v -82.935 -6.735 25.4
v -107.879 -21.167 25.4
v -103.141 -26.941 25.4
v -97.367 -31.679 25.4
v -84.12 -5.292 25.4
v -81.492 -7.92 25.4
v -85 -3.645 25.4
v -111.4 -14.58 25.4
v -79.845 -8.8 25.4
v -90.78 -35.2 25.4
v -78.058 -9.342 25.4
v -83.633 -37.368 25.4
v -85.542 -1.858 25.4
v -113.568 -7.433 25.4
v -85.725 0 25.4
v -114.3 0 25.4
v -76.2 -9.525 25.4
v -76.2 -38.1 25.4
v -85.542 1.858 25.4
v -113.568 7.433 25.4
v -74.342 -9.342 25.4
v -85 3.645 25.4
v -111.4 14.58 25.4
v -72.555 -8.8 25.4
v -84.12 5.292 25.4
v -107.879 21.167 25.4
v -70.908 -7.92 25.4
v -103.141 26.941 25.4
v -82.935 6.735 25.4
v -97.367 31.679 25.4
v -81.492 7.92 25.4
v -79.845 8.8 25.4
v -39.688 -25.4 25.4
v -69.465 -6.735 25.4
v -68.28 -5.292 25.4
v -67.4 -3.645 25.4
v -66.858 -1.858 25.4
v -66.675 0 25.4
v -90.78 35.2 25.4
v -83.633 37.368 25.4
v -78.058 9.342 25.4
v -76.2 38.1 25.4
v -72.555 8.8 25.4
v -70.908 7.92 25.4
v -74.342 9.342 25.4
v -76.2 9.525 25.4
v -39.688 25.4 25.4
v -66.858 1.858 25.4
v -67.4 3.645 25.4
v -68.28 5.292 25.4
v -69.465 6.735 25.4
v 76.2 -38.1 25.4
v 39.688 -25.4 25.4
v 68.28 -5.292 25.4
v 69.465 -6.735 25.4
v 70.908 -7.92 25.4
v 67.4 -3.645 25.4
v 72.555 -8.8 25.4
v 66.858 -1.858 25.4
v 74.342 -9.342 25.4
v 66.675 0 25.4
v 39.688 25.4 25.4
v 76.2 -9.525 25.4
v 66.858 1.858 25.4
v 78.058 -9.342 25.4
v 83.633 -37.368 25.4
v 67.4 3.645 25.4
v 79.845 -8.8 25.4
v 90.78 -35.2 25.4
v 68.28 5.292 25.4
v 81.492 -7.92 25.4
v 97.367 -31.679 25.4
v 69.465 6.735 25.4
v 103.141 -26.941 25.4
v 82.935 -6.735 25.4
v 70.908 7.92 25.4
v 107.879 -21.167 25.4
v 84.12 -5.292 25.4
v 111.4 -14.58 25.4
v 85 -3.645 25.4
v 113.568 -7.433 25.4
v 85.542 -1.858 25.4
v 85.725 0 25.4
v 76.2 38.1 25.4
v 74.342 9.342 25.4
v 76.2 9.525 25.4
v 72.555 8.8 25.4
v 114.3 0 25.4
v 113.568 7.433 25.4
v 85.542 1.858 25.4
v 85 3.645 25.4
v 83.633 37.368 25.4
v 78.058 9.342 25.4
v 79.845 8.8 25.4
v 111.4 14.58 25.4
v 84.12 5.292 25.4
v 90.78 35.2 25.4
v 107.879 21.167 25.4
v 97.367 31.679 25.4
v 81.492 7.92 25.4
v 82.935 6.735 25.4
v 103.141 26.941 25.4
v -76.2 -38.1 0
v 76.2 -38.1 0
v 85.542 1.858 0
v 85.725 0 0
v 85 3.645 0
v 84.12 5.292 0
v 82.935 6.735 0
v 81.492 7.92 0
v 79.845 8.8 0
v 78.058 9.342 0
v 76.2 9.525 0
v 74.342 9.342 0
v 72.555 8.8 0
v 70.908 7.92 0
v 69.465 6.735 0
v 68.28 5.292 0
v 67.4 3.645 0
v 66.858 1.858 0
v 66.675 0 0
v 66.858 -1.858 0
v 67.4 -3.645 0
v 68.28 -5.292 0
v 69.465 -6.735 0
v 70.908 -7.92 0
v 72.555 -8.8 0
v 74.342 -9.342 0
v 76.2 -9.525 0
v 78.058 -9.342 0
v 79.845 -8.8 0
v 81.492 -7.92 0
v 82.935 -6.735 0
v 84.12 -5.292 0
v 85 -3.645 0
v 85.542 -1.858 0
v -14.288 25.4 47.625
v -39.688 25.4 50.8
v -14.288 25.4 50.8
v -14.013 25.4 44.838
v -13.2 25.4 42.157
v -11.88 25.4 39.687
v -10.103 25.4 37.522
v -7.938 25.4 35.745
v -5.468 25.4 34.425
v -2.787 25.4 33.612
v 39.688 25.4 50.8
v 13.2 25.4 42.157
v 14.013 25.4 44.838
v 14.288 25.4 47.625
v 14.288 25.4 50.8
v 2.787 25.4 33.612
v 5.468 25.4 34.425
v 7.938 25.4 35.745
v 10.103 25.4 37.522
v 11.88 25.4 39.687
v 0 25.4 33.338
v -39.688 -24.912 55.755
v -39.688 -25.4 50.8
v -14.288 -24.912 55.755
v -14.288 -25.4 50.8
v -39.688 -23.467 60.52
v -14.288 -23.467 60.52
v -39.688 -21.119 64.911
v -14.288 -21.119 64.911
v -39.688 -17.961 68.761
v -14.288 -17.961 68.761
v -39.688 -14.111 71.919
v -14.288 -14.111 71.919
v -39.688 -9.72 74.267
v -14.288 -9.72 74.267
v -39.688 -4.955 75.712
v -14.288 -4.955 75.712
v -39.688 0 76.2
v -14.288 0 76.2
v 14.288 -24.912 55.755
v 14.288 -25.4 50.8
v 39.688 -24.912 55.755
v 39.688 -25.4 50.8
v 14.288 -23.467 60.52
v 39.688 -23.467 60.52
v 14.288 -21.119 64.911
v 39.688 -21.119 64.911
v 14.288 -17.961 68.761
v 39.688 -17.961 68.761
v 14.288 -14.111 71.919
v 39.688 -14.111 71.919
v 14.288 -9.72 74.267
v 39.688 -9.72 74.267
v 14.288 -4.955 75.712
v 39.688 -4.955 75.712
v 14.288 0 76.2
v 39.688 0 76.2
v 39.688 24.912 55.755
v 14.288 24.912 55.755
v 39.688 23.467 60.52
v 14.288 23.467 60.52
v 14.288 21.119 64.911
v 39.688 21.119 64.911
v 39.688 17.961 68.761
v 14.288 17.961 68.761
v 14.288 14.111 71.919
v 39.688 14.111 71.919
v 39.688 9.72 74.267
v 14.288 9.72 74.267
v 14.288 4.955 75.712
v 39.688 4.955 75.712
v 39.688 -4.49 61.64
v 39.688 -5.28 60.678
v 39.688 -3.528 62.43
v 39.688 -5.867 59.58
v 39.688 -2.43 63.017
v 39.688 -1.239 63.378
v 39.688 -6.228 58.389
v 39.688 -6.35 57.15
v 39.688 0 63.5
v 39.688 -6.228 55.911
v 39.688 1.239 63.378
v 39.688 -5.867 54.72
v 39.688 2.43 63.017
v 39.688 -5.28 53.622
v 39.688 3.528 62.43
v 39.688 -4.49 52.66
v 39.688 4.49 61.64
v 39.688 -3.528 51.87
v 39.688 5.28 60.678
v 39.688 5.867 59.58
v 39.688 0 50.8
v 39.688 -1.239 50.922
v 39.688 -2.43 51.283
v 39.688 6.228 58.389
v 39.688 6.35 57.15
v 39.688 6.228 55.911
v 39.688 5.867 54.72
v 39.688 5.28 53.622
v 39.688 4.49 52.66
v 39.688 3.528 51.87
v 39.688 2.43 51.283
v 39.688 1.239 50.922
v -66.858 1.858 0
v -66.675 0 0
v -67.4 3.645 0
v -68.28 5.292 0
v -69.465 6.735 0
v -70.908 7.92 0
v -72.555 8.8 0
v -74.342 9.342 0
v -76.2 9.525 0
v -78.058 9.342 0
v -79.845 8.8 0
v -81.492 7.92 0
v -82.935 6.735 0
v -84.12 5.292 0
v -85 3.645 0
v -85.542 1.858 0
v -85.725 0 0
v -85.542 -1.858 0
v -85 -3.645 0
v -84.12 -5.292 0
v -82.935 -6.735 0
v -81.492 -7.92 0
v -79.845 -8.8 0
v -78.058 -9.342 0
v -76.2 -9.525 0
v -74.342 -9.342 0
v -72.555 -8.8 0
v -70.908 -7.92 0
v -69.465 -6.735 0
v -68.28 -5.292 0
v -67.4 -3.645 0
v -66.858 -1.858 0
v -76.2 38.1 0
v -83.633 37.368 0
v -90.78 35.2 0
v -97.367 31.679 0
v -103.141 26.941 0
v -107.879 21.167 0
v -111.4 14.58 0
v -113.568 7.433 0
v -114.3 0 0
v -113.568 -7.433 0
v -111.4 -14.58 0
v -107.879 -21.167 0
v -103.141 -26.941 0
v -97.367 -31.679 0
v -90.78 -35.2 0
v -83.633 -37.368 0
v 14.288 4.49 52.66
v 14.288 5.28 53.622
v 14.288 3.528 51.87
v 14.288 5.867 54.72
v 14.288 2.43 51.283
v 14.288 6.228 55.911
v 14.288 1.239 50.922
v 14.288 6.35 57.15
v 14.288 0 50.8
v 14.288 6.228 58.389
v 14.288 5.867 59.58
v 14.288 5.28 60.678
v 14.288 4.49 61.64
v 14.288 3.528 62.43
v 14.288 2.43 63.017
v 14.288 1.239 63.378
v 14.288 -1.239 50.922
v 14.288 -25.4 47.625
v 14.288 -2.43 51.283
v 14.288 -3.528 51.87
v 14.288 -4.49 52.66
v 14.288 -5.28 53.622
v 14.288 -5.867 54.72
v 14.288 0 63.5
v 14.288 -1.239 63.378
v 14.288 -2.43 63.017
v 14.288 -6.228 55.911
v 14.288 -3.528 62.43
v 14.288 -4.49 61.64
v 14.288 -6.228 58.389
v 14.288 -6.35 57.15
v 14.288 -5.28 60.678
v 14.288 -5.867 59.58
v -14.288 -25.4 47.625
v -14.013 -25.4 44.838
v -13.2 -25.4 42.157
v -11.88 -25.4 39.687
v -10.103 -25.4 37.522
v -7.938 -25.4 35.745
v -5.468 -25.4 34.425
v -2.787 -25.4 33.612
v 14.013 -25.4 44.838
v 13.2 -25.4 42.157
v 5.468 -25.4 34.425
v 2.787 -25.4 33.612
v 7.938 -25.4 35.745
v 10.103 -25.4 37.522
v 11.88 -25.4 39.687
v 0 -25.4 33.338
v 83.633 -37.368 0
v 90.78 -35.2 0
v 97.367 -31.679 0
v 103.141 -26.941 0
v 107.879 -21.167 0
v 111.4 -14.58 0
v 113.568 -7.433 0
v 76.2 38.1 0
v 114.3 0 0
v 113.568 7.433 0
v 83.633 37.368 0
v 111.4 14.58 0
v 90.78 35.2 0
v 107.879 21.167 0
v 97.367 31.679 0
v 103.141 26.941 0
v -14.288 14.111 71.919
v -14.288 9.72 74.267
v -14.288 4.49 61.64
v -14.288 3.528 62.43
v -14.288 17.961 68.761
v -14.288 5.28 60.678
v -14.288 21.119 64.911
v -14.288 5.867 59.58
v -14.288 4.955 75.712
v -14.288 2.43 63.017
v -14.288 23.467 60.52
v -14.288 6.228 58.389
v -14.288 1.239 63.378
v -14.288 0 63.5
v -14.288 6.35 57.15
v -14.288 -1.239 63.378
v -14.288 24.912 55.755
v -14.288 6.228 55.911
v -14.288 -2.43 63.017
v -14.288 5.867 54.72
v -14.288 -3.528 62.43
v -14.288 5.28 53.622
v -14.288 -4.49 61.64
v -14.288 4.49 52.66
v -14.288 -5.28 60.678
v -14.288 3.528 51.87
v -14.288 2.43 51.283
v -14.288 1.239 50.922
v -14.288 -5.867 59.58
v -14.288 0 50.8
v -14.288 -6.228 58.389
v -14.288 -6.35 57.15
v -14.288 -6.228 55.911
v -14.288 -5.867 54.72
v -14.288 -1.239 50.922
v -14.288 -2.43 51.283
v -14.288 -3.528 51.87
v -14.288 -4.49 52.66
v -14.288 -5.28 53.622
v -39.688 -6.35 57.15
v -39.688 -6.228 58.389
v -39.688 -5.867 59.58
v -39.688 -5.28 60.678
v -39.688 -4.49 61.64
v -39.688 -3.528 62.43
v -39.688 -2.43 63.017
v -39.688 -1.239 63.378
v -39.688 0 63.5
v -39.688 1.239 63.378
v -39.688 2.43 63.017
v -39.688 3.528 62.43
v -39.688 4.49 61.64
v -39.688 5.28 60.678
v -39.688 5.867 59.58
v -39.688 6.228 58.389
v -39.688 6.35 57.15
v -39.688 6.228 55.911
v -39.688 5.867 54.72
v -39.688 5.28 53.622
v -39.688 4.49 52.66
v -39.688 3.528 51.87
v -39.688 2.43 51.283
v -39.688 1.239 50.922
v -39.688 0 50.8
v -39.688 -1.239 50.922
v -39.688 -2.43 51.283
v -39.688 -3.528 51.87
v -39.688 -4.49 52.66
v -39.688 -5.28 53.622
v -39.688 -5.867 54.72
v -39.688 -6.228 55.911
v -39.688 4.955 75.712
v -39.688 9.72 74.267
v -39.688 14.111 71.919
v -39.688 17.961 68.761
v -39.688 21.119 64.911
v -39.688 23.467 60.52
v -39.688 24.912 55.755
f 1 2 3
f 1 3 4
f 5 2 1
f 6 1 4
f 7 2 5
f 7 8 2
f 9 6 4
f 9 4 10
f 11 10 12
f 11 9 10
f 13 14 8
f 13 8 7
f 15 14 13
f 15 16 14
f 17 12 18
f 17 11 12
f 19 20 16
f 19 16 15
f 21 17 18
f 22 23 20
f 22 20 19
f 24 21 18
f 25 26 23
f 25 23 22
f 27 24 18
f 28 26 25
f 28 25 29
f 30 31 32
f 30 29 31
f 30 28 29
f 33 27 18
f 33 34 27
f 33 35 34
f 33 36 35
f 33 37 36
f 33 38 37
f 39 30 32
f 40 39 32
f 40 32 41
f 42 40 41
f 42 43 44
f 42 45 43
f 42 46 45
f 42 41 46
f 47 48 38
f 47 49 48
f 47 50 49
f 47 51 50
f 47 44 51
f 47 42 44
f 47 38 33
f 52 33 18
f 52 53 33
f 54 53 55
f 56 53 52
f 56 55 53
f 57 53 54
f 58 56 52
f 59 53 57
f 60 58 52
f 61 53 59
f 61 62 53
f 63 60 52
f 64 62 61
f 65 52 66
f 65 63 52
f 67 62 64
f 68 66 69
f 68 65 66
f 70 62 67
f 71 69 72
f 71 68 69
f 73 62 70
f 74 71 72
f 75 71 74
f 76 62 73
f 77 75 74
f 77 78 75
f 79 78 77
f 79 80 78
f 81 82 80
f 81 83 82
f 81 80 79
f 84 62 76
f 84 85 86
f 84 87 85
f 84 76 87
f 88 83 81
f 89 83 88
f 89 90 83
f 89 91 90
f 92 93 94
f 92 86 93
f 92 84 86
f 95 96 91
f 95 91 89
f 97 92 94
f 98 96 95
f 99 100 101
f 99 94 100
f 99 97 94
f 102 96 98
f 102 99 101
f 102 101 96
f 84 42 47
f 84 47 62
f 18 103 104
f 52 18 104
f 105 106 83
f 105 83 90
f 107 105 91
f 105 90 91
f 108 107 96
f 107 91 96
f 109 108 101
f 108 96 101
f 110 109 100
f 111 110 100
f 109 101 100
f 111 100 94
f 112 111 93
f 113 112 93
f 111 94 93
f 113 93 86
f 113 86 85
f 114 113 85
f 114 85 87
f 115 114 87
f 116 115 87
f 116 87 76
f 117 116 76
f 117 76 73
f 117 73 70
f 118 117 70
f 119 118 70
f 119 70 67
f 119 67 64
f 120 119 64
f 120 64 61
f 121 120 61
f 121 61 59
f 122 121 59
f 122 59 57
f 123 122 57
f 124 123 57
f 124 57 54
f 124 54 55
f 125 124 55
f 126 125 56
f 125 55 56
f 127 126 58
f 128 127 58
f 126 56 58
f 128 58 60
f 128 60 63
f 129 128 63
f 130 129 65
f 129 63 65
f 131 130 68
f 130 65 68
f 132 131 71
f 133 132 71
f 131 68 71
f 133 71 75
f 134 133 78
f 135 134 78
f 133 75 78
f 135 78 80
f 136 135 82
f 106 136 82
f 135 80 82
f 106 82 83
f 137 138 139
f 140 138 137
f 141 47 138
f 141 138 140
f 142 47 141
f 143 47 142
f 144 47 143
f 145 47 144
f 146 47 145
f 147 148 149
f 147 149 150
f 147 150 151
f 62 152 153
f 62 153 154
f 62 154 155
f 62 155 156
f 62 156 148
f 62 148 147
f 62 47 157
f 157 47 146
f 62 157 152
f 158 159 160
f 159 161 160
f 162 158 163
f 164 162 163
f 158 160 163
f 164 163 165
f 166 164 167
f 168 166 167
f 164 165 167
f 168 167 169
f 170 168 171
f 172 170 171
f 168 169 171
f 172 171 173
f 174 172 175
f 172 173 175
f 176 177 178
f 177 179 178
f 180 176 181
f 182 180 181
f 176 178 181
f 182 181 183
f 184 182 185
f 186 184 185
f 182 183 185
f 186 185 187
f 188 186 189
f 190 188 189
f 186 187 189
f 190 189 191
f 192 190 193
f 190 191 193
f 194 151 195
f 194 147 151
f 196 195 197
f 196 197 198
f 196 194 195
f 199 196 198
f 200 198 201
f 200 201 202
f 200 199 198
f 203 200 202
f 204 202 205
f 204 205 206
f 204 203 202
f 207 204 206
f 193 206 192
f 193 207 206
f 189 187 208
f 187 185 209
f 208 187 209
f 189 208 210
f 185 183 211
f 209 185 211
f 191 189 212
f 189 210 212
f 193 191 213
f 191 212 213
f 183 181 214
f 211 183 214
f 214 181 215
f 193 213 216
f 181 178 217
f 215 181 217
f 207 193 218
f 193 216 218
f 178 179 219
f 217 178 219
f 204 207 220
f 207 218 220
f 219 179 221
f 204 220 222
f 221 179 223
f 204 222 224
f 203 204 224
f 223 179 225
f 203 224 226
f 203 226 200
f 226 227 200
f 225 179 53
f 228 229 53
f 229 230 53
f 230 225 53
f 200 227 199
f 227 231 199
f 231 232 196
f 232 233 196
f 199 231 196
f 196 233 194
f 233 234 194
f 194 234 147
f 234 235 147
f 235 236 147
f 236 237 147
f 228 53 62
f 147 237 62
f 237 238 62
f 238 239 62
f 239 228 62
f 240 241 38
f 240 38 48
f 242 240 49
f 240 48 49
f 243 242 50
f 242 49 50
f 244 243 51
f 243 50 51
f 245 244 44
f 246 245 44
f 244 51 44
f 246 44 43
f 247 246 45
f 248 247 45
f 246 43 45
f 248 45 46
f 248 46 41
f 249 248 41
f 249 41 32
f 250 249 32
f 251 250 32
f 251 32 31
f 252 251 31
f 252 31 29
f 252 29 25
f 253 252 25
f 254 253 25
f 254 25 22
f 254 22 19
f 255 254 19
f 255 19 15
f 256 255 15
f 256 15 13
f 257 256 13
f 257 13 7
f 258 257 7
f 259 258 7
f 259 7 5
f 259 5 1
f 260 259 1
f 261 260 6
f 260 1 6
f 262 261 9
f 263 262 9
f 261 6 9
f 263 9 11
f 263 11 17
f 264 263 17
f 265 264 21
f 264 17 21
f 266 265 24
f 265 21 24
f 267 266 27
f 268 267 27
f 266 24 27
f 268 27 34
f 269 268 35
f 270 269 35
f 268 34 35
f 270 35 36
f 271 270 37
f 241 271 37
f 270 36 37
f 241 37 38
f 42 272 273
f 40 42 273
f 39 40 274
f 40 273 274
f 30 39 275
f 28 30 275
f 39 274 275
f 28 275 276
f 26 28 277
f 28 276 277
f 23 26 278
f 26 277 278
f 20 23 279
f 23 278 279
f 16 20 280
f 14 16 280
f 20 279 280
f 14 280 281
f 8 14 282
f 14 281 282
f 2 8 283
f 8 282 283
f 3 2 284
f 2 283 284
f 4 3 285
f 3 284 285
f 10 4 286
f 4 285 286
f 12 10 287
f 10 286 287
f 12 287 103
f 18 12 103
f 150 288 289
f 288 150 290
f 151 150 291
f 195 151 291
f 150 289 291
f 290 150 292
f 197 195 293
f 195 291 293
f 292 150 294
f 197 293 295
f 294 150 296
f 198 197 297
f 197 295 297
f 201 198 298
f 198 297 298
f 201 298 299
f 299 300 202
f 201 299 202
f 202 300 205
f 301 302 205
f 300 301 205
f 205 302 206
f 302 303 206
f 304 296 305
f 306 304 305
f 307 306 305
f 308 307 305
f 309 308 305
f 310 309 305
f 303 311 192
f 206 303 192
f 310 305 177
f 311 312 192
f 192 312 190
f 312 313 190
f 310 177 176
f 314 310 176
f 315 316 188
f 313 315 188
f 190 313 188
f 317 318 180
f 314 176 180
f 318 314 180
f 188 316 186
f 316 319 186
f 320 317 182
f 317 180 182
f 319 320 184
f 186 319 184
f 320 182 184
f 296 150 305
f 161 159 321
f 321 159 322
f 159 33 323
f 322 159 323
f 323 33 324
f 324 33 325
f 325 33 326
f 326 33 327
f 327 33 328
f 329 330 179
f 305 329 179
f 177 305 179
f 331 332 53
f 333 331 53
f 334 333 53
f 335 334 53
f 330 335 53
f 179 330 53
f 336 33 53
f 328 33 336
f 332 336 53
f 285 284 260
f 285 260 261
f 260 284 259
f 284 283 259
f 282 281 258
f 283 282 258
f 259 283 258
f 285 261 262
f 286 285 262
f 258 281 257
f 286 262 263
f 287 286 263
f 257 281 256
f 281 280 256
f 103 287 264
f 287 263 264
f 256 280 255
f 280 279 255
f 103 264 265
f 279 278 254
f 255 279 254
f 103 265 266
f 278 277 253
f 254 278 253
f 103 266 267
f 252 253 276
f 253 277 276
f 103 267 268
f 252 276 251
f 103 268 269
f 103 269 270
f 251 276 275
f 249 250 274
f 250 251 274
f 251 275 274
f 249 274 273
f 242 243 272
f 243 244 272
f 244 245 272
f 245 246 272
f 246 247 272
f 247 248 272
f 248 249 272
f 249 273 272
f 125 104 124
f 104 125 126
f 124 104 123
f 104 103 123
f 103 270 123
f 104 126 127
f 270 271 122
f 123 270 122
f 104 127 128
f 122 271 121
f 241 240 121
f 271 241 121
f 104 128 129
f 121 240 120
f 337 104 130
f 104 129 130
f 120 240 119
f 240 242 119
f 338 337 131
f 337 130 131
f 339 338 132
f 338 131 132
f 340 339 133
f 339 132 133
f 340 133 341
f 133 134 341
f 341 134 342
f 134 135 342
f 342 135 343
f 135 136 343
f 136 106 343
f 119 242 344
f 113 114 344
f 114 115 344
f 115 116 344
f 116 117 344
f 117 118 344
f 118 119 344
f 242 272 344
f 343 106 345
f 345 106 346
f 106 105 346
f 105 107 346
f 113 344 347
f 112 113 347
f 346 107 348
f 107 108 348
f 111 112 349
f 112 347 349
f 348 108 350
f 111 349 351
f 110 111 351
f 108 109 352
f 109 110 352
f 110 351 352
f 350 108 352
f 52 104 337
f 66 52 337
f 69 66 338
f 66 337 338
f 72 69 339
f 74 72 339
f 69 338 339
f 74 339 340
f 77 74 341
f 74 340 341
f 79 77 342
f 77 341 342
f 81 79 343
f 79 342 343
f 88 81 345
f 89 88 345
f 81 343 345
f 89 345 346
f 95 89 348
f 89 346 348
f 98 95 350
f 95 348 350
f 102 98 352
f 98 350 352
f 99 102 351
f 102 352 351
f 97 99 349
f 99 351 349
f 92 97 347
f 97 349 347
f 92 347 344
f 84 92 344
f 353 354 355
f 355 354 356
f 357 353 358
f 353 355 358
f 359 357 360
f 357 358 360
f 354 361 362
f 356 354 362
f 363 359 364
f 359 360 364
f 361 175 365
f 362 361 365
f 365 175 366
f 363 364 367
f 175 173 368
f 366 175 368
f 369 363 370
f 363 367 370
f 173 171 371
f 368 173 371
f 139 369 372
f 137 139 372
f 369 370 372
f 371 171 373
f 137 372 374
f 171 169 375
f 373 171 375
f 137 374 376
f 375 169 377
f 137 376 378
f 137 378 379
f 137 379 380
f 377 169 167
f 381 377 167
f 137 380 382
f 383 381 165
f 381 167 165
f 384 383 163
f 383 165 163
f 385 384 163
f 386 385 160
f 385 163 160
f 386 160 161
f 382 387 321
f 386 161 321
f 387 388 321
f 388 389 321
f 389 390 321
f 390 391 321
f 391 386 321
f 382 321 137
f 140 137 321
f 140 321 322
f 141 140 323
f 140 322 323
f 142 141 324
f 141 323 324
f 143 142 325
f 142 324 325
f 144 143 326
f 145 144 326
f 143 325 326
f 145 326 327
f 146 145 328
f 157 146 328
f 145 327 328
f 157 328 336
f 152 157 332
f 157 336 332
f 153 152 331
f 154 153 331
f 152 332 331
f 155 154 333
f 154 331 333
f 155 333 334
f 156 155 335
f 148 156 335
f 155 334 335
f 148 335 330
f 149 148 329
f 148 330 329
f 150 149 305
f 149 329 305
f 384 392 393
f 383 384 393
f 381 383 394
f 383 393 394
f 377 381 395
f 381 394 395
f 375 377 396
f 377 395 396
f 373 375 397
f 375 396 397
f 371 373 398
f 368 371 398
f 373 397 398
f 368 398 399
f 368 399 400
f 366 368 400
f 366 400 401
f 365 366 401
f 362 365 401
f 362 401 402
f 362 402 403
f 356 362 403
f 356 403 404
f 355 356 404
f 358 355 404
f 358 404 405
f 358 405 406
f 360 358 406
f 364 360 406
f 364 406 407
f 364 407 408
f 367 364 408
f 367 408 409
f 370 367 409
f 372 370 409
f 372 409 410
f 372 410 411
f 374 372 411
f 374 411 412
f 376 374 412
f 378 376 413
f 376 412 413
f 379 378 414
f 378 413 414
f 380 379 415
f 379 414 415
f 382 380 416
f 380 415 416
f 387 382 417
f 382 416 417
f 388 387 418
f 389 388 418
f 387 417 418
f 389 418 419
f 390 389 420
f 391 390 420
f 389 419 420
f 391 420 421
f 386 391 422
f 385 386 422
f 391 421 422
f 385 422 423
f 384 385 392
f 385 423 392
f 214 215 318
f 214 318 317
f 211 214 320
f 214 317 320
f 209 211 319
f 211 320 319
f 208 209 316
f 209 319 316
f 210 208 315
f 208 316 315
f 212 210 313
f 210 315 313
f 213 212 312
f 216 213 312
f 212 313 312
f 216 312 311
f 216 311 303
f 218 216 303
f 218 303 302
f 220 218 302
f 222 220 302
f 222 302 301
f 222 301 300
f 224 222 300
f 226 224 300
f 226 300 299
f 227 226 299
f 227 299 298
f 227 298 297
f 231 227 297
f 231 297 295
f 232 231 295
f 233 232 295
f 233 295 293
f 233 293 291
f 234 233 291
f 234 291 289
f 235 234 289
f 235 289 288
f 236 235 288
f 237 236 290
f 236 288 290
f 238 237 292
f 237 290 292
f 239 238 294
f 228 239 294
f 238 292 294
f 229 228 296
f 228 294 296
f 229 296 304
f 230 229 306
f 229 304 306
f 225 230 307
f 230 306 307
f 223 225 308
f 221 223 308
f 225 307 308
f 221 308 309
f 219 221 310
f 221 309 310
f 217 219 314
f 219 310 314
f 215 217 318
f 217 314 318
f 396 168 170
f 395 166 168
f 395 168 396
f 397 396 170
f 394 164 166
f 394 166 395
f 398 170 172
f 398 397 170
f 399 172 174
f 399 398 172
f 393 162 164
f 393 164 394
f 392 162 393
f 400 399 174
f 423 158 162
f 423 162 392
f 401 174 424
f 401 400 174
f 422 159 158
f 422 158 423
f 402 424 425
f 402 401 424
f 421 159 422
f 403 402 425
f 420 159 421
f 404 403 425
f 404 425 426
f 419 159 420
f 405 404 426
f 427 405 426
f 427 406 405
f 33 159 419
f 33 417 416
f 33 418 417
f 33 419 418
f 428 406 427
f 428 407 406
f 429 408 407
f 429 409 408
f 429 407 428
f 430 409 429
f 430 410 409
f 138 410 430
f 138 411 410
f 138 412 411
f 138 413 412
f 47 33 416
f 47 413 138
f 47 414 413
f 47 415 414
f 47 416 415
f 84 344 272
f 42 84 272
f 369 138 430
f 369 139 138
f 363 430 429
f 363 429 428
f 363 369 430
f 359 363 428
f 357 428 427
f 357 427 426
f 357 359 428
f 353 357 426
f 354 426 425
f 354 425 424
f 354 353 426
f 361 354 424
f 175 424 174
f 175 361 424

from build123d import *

# Parameters (mm, degrees)
F1_DEPTH  = 25.4
F2_W      = 79.375
F2_H      = 50.8
F3_DEPTH  = 50.8
F5_DEPTH  = 63.501
F6_R      = 25.39999
F7_R      = 6.35
F8_DEPTH  = 127
F9_R      = 9.525
F10_DEPTH = 25.401


# Not quite as in the source:
# - a fillet or chamfer is up to 0.001 mm smaller than in the source, because OpenCascade refuses the exact size


with BuildPart() as f1:
    # F0 (on Top) → F1 (new body)
    with BuildSketch(Plane.XY):
        with BuildLine():
            ThreePointArc((76.2, -38.1), (114.3, 0), (76.2, 38.1))
            Line((76.2, 38.1), (-76.2, 38.1))
            ThreePointArc((-76.2, 38.1), (-114.3, 0), (-76.2, -38.1))
            Line((-76.2, -38.1), (76.2, -38.1))
        make_face()
    extrude(amount=F1_DEPTH)

    # F2 (on face) → F3 (join)
    with BuildSketch(Plane.XY.offset(25.4)):
        Rectangle(F2_W, F2_H)
    extrude(amount=F3_DEPTH)

    # F4 (on face) → F5 (cut, through all)
    with BuildSketch(Plane.XZ.offset(25.4)):
        with BuildLine():
            Line((14.2875, 76.2), (-14.2875, 76.2))
            Line((-14.2875, 76.2), (-14.2875, 47.625))
            ThreePointArc((-14.2875, 47.625), (0, 33.3375), (14.2875, 47.625))
            Line((14.2875, 47.625), (14.2875, 76.2))
        make_face()
    extrude(amount=-F5_DEPTH, mode=Mode.SUBTRACT)

    # F6 (radius 25.4 in the source; OpenCascade refuses exactly that, so slightly less here)
    f6_edges = [f1.edges().sort_by_distance(p)[0] for p in [
        (-26.9875, -25.4, 76.2),
        (-26.9875, 25.4, 76.2),
        (26.9875, -25.4, 76.2),
        (26.9875, 25.4, 76.2),
    ]]
    fillet(f6_edges, radius=F6_R)

    # F7 (on face) → F8 (cut)
    with BuildSketch(Plane(origin=(-39.6875, 0, 0), x_dir=(0, -1, 0), z_dir=(-1, 0, 0))):
        with Locations((0, 57.15)):
            Circle(F7_R)
    extrude(amount=-F8_DEPTH, mode=Mode.SUBTRACT)

    # F9 (on face) → F10 (cut, through all)
    with BuildSketch(Plane.XY.offset(25.4)):
        with Locations((-76.2, 0)):
            Circle(F9_R)
        with Locations((76.2, 0)):
            Circle(F9_R)
    extrude(amount=-F10_DEPTH, mode=Mode.SUBTRACT)


solid = f1.part
